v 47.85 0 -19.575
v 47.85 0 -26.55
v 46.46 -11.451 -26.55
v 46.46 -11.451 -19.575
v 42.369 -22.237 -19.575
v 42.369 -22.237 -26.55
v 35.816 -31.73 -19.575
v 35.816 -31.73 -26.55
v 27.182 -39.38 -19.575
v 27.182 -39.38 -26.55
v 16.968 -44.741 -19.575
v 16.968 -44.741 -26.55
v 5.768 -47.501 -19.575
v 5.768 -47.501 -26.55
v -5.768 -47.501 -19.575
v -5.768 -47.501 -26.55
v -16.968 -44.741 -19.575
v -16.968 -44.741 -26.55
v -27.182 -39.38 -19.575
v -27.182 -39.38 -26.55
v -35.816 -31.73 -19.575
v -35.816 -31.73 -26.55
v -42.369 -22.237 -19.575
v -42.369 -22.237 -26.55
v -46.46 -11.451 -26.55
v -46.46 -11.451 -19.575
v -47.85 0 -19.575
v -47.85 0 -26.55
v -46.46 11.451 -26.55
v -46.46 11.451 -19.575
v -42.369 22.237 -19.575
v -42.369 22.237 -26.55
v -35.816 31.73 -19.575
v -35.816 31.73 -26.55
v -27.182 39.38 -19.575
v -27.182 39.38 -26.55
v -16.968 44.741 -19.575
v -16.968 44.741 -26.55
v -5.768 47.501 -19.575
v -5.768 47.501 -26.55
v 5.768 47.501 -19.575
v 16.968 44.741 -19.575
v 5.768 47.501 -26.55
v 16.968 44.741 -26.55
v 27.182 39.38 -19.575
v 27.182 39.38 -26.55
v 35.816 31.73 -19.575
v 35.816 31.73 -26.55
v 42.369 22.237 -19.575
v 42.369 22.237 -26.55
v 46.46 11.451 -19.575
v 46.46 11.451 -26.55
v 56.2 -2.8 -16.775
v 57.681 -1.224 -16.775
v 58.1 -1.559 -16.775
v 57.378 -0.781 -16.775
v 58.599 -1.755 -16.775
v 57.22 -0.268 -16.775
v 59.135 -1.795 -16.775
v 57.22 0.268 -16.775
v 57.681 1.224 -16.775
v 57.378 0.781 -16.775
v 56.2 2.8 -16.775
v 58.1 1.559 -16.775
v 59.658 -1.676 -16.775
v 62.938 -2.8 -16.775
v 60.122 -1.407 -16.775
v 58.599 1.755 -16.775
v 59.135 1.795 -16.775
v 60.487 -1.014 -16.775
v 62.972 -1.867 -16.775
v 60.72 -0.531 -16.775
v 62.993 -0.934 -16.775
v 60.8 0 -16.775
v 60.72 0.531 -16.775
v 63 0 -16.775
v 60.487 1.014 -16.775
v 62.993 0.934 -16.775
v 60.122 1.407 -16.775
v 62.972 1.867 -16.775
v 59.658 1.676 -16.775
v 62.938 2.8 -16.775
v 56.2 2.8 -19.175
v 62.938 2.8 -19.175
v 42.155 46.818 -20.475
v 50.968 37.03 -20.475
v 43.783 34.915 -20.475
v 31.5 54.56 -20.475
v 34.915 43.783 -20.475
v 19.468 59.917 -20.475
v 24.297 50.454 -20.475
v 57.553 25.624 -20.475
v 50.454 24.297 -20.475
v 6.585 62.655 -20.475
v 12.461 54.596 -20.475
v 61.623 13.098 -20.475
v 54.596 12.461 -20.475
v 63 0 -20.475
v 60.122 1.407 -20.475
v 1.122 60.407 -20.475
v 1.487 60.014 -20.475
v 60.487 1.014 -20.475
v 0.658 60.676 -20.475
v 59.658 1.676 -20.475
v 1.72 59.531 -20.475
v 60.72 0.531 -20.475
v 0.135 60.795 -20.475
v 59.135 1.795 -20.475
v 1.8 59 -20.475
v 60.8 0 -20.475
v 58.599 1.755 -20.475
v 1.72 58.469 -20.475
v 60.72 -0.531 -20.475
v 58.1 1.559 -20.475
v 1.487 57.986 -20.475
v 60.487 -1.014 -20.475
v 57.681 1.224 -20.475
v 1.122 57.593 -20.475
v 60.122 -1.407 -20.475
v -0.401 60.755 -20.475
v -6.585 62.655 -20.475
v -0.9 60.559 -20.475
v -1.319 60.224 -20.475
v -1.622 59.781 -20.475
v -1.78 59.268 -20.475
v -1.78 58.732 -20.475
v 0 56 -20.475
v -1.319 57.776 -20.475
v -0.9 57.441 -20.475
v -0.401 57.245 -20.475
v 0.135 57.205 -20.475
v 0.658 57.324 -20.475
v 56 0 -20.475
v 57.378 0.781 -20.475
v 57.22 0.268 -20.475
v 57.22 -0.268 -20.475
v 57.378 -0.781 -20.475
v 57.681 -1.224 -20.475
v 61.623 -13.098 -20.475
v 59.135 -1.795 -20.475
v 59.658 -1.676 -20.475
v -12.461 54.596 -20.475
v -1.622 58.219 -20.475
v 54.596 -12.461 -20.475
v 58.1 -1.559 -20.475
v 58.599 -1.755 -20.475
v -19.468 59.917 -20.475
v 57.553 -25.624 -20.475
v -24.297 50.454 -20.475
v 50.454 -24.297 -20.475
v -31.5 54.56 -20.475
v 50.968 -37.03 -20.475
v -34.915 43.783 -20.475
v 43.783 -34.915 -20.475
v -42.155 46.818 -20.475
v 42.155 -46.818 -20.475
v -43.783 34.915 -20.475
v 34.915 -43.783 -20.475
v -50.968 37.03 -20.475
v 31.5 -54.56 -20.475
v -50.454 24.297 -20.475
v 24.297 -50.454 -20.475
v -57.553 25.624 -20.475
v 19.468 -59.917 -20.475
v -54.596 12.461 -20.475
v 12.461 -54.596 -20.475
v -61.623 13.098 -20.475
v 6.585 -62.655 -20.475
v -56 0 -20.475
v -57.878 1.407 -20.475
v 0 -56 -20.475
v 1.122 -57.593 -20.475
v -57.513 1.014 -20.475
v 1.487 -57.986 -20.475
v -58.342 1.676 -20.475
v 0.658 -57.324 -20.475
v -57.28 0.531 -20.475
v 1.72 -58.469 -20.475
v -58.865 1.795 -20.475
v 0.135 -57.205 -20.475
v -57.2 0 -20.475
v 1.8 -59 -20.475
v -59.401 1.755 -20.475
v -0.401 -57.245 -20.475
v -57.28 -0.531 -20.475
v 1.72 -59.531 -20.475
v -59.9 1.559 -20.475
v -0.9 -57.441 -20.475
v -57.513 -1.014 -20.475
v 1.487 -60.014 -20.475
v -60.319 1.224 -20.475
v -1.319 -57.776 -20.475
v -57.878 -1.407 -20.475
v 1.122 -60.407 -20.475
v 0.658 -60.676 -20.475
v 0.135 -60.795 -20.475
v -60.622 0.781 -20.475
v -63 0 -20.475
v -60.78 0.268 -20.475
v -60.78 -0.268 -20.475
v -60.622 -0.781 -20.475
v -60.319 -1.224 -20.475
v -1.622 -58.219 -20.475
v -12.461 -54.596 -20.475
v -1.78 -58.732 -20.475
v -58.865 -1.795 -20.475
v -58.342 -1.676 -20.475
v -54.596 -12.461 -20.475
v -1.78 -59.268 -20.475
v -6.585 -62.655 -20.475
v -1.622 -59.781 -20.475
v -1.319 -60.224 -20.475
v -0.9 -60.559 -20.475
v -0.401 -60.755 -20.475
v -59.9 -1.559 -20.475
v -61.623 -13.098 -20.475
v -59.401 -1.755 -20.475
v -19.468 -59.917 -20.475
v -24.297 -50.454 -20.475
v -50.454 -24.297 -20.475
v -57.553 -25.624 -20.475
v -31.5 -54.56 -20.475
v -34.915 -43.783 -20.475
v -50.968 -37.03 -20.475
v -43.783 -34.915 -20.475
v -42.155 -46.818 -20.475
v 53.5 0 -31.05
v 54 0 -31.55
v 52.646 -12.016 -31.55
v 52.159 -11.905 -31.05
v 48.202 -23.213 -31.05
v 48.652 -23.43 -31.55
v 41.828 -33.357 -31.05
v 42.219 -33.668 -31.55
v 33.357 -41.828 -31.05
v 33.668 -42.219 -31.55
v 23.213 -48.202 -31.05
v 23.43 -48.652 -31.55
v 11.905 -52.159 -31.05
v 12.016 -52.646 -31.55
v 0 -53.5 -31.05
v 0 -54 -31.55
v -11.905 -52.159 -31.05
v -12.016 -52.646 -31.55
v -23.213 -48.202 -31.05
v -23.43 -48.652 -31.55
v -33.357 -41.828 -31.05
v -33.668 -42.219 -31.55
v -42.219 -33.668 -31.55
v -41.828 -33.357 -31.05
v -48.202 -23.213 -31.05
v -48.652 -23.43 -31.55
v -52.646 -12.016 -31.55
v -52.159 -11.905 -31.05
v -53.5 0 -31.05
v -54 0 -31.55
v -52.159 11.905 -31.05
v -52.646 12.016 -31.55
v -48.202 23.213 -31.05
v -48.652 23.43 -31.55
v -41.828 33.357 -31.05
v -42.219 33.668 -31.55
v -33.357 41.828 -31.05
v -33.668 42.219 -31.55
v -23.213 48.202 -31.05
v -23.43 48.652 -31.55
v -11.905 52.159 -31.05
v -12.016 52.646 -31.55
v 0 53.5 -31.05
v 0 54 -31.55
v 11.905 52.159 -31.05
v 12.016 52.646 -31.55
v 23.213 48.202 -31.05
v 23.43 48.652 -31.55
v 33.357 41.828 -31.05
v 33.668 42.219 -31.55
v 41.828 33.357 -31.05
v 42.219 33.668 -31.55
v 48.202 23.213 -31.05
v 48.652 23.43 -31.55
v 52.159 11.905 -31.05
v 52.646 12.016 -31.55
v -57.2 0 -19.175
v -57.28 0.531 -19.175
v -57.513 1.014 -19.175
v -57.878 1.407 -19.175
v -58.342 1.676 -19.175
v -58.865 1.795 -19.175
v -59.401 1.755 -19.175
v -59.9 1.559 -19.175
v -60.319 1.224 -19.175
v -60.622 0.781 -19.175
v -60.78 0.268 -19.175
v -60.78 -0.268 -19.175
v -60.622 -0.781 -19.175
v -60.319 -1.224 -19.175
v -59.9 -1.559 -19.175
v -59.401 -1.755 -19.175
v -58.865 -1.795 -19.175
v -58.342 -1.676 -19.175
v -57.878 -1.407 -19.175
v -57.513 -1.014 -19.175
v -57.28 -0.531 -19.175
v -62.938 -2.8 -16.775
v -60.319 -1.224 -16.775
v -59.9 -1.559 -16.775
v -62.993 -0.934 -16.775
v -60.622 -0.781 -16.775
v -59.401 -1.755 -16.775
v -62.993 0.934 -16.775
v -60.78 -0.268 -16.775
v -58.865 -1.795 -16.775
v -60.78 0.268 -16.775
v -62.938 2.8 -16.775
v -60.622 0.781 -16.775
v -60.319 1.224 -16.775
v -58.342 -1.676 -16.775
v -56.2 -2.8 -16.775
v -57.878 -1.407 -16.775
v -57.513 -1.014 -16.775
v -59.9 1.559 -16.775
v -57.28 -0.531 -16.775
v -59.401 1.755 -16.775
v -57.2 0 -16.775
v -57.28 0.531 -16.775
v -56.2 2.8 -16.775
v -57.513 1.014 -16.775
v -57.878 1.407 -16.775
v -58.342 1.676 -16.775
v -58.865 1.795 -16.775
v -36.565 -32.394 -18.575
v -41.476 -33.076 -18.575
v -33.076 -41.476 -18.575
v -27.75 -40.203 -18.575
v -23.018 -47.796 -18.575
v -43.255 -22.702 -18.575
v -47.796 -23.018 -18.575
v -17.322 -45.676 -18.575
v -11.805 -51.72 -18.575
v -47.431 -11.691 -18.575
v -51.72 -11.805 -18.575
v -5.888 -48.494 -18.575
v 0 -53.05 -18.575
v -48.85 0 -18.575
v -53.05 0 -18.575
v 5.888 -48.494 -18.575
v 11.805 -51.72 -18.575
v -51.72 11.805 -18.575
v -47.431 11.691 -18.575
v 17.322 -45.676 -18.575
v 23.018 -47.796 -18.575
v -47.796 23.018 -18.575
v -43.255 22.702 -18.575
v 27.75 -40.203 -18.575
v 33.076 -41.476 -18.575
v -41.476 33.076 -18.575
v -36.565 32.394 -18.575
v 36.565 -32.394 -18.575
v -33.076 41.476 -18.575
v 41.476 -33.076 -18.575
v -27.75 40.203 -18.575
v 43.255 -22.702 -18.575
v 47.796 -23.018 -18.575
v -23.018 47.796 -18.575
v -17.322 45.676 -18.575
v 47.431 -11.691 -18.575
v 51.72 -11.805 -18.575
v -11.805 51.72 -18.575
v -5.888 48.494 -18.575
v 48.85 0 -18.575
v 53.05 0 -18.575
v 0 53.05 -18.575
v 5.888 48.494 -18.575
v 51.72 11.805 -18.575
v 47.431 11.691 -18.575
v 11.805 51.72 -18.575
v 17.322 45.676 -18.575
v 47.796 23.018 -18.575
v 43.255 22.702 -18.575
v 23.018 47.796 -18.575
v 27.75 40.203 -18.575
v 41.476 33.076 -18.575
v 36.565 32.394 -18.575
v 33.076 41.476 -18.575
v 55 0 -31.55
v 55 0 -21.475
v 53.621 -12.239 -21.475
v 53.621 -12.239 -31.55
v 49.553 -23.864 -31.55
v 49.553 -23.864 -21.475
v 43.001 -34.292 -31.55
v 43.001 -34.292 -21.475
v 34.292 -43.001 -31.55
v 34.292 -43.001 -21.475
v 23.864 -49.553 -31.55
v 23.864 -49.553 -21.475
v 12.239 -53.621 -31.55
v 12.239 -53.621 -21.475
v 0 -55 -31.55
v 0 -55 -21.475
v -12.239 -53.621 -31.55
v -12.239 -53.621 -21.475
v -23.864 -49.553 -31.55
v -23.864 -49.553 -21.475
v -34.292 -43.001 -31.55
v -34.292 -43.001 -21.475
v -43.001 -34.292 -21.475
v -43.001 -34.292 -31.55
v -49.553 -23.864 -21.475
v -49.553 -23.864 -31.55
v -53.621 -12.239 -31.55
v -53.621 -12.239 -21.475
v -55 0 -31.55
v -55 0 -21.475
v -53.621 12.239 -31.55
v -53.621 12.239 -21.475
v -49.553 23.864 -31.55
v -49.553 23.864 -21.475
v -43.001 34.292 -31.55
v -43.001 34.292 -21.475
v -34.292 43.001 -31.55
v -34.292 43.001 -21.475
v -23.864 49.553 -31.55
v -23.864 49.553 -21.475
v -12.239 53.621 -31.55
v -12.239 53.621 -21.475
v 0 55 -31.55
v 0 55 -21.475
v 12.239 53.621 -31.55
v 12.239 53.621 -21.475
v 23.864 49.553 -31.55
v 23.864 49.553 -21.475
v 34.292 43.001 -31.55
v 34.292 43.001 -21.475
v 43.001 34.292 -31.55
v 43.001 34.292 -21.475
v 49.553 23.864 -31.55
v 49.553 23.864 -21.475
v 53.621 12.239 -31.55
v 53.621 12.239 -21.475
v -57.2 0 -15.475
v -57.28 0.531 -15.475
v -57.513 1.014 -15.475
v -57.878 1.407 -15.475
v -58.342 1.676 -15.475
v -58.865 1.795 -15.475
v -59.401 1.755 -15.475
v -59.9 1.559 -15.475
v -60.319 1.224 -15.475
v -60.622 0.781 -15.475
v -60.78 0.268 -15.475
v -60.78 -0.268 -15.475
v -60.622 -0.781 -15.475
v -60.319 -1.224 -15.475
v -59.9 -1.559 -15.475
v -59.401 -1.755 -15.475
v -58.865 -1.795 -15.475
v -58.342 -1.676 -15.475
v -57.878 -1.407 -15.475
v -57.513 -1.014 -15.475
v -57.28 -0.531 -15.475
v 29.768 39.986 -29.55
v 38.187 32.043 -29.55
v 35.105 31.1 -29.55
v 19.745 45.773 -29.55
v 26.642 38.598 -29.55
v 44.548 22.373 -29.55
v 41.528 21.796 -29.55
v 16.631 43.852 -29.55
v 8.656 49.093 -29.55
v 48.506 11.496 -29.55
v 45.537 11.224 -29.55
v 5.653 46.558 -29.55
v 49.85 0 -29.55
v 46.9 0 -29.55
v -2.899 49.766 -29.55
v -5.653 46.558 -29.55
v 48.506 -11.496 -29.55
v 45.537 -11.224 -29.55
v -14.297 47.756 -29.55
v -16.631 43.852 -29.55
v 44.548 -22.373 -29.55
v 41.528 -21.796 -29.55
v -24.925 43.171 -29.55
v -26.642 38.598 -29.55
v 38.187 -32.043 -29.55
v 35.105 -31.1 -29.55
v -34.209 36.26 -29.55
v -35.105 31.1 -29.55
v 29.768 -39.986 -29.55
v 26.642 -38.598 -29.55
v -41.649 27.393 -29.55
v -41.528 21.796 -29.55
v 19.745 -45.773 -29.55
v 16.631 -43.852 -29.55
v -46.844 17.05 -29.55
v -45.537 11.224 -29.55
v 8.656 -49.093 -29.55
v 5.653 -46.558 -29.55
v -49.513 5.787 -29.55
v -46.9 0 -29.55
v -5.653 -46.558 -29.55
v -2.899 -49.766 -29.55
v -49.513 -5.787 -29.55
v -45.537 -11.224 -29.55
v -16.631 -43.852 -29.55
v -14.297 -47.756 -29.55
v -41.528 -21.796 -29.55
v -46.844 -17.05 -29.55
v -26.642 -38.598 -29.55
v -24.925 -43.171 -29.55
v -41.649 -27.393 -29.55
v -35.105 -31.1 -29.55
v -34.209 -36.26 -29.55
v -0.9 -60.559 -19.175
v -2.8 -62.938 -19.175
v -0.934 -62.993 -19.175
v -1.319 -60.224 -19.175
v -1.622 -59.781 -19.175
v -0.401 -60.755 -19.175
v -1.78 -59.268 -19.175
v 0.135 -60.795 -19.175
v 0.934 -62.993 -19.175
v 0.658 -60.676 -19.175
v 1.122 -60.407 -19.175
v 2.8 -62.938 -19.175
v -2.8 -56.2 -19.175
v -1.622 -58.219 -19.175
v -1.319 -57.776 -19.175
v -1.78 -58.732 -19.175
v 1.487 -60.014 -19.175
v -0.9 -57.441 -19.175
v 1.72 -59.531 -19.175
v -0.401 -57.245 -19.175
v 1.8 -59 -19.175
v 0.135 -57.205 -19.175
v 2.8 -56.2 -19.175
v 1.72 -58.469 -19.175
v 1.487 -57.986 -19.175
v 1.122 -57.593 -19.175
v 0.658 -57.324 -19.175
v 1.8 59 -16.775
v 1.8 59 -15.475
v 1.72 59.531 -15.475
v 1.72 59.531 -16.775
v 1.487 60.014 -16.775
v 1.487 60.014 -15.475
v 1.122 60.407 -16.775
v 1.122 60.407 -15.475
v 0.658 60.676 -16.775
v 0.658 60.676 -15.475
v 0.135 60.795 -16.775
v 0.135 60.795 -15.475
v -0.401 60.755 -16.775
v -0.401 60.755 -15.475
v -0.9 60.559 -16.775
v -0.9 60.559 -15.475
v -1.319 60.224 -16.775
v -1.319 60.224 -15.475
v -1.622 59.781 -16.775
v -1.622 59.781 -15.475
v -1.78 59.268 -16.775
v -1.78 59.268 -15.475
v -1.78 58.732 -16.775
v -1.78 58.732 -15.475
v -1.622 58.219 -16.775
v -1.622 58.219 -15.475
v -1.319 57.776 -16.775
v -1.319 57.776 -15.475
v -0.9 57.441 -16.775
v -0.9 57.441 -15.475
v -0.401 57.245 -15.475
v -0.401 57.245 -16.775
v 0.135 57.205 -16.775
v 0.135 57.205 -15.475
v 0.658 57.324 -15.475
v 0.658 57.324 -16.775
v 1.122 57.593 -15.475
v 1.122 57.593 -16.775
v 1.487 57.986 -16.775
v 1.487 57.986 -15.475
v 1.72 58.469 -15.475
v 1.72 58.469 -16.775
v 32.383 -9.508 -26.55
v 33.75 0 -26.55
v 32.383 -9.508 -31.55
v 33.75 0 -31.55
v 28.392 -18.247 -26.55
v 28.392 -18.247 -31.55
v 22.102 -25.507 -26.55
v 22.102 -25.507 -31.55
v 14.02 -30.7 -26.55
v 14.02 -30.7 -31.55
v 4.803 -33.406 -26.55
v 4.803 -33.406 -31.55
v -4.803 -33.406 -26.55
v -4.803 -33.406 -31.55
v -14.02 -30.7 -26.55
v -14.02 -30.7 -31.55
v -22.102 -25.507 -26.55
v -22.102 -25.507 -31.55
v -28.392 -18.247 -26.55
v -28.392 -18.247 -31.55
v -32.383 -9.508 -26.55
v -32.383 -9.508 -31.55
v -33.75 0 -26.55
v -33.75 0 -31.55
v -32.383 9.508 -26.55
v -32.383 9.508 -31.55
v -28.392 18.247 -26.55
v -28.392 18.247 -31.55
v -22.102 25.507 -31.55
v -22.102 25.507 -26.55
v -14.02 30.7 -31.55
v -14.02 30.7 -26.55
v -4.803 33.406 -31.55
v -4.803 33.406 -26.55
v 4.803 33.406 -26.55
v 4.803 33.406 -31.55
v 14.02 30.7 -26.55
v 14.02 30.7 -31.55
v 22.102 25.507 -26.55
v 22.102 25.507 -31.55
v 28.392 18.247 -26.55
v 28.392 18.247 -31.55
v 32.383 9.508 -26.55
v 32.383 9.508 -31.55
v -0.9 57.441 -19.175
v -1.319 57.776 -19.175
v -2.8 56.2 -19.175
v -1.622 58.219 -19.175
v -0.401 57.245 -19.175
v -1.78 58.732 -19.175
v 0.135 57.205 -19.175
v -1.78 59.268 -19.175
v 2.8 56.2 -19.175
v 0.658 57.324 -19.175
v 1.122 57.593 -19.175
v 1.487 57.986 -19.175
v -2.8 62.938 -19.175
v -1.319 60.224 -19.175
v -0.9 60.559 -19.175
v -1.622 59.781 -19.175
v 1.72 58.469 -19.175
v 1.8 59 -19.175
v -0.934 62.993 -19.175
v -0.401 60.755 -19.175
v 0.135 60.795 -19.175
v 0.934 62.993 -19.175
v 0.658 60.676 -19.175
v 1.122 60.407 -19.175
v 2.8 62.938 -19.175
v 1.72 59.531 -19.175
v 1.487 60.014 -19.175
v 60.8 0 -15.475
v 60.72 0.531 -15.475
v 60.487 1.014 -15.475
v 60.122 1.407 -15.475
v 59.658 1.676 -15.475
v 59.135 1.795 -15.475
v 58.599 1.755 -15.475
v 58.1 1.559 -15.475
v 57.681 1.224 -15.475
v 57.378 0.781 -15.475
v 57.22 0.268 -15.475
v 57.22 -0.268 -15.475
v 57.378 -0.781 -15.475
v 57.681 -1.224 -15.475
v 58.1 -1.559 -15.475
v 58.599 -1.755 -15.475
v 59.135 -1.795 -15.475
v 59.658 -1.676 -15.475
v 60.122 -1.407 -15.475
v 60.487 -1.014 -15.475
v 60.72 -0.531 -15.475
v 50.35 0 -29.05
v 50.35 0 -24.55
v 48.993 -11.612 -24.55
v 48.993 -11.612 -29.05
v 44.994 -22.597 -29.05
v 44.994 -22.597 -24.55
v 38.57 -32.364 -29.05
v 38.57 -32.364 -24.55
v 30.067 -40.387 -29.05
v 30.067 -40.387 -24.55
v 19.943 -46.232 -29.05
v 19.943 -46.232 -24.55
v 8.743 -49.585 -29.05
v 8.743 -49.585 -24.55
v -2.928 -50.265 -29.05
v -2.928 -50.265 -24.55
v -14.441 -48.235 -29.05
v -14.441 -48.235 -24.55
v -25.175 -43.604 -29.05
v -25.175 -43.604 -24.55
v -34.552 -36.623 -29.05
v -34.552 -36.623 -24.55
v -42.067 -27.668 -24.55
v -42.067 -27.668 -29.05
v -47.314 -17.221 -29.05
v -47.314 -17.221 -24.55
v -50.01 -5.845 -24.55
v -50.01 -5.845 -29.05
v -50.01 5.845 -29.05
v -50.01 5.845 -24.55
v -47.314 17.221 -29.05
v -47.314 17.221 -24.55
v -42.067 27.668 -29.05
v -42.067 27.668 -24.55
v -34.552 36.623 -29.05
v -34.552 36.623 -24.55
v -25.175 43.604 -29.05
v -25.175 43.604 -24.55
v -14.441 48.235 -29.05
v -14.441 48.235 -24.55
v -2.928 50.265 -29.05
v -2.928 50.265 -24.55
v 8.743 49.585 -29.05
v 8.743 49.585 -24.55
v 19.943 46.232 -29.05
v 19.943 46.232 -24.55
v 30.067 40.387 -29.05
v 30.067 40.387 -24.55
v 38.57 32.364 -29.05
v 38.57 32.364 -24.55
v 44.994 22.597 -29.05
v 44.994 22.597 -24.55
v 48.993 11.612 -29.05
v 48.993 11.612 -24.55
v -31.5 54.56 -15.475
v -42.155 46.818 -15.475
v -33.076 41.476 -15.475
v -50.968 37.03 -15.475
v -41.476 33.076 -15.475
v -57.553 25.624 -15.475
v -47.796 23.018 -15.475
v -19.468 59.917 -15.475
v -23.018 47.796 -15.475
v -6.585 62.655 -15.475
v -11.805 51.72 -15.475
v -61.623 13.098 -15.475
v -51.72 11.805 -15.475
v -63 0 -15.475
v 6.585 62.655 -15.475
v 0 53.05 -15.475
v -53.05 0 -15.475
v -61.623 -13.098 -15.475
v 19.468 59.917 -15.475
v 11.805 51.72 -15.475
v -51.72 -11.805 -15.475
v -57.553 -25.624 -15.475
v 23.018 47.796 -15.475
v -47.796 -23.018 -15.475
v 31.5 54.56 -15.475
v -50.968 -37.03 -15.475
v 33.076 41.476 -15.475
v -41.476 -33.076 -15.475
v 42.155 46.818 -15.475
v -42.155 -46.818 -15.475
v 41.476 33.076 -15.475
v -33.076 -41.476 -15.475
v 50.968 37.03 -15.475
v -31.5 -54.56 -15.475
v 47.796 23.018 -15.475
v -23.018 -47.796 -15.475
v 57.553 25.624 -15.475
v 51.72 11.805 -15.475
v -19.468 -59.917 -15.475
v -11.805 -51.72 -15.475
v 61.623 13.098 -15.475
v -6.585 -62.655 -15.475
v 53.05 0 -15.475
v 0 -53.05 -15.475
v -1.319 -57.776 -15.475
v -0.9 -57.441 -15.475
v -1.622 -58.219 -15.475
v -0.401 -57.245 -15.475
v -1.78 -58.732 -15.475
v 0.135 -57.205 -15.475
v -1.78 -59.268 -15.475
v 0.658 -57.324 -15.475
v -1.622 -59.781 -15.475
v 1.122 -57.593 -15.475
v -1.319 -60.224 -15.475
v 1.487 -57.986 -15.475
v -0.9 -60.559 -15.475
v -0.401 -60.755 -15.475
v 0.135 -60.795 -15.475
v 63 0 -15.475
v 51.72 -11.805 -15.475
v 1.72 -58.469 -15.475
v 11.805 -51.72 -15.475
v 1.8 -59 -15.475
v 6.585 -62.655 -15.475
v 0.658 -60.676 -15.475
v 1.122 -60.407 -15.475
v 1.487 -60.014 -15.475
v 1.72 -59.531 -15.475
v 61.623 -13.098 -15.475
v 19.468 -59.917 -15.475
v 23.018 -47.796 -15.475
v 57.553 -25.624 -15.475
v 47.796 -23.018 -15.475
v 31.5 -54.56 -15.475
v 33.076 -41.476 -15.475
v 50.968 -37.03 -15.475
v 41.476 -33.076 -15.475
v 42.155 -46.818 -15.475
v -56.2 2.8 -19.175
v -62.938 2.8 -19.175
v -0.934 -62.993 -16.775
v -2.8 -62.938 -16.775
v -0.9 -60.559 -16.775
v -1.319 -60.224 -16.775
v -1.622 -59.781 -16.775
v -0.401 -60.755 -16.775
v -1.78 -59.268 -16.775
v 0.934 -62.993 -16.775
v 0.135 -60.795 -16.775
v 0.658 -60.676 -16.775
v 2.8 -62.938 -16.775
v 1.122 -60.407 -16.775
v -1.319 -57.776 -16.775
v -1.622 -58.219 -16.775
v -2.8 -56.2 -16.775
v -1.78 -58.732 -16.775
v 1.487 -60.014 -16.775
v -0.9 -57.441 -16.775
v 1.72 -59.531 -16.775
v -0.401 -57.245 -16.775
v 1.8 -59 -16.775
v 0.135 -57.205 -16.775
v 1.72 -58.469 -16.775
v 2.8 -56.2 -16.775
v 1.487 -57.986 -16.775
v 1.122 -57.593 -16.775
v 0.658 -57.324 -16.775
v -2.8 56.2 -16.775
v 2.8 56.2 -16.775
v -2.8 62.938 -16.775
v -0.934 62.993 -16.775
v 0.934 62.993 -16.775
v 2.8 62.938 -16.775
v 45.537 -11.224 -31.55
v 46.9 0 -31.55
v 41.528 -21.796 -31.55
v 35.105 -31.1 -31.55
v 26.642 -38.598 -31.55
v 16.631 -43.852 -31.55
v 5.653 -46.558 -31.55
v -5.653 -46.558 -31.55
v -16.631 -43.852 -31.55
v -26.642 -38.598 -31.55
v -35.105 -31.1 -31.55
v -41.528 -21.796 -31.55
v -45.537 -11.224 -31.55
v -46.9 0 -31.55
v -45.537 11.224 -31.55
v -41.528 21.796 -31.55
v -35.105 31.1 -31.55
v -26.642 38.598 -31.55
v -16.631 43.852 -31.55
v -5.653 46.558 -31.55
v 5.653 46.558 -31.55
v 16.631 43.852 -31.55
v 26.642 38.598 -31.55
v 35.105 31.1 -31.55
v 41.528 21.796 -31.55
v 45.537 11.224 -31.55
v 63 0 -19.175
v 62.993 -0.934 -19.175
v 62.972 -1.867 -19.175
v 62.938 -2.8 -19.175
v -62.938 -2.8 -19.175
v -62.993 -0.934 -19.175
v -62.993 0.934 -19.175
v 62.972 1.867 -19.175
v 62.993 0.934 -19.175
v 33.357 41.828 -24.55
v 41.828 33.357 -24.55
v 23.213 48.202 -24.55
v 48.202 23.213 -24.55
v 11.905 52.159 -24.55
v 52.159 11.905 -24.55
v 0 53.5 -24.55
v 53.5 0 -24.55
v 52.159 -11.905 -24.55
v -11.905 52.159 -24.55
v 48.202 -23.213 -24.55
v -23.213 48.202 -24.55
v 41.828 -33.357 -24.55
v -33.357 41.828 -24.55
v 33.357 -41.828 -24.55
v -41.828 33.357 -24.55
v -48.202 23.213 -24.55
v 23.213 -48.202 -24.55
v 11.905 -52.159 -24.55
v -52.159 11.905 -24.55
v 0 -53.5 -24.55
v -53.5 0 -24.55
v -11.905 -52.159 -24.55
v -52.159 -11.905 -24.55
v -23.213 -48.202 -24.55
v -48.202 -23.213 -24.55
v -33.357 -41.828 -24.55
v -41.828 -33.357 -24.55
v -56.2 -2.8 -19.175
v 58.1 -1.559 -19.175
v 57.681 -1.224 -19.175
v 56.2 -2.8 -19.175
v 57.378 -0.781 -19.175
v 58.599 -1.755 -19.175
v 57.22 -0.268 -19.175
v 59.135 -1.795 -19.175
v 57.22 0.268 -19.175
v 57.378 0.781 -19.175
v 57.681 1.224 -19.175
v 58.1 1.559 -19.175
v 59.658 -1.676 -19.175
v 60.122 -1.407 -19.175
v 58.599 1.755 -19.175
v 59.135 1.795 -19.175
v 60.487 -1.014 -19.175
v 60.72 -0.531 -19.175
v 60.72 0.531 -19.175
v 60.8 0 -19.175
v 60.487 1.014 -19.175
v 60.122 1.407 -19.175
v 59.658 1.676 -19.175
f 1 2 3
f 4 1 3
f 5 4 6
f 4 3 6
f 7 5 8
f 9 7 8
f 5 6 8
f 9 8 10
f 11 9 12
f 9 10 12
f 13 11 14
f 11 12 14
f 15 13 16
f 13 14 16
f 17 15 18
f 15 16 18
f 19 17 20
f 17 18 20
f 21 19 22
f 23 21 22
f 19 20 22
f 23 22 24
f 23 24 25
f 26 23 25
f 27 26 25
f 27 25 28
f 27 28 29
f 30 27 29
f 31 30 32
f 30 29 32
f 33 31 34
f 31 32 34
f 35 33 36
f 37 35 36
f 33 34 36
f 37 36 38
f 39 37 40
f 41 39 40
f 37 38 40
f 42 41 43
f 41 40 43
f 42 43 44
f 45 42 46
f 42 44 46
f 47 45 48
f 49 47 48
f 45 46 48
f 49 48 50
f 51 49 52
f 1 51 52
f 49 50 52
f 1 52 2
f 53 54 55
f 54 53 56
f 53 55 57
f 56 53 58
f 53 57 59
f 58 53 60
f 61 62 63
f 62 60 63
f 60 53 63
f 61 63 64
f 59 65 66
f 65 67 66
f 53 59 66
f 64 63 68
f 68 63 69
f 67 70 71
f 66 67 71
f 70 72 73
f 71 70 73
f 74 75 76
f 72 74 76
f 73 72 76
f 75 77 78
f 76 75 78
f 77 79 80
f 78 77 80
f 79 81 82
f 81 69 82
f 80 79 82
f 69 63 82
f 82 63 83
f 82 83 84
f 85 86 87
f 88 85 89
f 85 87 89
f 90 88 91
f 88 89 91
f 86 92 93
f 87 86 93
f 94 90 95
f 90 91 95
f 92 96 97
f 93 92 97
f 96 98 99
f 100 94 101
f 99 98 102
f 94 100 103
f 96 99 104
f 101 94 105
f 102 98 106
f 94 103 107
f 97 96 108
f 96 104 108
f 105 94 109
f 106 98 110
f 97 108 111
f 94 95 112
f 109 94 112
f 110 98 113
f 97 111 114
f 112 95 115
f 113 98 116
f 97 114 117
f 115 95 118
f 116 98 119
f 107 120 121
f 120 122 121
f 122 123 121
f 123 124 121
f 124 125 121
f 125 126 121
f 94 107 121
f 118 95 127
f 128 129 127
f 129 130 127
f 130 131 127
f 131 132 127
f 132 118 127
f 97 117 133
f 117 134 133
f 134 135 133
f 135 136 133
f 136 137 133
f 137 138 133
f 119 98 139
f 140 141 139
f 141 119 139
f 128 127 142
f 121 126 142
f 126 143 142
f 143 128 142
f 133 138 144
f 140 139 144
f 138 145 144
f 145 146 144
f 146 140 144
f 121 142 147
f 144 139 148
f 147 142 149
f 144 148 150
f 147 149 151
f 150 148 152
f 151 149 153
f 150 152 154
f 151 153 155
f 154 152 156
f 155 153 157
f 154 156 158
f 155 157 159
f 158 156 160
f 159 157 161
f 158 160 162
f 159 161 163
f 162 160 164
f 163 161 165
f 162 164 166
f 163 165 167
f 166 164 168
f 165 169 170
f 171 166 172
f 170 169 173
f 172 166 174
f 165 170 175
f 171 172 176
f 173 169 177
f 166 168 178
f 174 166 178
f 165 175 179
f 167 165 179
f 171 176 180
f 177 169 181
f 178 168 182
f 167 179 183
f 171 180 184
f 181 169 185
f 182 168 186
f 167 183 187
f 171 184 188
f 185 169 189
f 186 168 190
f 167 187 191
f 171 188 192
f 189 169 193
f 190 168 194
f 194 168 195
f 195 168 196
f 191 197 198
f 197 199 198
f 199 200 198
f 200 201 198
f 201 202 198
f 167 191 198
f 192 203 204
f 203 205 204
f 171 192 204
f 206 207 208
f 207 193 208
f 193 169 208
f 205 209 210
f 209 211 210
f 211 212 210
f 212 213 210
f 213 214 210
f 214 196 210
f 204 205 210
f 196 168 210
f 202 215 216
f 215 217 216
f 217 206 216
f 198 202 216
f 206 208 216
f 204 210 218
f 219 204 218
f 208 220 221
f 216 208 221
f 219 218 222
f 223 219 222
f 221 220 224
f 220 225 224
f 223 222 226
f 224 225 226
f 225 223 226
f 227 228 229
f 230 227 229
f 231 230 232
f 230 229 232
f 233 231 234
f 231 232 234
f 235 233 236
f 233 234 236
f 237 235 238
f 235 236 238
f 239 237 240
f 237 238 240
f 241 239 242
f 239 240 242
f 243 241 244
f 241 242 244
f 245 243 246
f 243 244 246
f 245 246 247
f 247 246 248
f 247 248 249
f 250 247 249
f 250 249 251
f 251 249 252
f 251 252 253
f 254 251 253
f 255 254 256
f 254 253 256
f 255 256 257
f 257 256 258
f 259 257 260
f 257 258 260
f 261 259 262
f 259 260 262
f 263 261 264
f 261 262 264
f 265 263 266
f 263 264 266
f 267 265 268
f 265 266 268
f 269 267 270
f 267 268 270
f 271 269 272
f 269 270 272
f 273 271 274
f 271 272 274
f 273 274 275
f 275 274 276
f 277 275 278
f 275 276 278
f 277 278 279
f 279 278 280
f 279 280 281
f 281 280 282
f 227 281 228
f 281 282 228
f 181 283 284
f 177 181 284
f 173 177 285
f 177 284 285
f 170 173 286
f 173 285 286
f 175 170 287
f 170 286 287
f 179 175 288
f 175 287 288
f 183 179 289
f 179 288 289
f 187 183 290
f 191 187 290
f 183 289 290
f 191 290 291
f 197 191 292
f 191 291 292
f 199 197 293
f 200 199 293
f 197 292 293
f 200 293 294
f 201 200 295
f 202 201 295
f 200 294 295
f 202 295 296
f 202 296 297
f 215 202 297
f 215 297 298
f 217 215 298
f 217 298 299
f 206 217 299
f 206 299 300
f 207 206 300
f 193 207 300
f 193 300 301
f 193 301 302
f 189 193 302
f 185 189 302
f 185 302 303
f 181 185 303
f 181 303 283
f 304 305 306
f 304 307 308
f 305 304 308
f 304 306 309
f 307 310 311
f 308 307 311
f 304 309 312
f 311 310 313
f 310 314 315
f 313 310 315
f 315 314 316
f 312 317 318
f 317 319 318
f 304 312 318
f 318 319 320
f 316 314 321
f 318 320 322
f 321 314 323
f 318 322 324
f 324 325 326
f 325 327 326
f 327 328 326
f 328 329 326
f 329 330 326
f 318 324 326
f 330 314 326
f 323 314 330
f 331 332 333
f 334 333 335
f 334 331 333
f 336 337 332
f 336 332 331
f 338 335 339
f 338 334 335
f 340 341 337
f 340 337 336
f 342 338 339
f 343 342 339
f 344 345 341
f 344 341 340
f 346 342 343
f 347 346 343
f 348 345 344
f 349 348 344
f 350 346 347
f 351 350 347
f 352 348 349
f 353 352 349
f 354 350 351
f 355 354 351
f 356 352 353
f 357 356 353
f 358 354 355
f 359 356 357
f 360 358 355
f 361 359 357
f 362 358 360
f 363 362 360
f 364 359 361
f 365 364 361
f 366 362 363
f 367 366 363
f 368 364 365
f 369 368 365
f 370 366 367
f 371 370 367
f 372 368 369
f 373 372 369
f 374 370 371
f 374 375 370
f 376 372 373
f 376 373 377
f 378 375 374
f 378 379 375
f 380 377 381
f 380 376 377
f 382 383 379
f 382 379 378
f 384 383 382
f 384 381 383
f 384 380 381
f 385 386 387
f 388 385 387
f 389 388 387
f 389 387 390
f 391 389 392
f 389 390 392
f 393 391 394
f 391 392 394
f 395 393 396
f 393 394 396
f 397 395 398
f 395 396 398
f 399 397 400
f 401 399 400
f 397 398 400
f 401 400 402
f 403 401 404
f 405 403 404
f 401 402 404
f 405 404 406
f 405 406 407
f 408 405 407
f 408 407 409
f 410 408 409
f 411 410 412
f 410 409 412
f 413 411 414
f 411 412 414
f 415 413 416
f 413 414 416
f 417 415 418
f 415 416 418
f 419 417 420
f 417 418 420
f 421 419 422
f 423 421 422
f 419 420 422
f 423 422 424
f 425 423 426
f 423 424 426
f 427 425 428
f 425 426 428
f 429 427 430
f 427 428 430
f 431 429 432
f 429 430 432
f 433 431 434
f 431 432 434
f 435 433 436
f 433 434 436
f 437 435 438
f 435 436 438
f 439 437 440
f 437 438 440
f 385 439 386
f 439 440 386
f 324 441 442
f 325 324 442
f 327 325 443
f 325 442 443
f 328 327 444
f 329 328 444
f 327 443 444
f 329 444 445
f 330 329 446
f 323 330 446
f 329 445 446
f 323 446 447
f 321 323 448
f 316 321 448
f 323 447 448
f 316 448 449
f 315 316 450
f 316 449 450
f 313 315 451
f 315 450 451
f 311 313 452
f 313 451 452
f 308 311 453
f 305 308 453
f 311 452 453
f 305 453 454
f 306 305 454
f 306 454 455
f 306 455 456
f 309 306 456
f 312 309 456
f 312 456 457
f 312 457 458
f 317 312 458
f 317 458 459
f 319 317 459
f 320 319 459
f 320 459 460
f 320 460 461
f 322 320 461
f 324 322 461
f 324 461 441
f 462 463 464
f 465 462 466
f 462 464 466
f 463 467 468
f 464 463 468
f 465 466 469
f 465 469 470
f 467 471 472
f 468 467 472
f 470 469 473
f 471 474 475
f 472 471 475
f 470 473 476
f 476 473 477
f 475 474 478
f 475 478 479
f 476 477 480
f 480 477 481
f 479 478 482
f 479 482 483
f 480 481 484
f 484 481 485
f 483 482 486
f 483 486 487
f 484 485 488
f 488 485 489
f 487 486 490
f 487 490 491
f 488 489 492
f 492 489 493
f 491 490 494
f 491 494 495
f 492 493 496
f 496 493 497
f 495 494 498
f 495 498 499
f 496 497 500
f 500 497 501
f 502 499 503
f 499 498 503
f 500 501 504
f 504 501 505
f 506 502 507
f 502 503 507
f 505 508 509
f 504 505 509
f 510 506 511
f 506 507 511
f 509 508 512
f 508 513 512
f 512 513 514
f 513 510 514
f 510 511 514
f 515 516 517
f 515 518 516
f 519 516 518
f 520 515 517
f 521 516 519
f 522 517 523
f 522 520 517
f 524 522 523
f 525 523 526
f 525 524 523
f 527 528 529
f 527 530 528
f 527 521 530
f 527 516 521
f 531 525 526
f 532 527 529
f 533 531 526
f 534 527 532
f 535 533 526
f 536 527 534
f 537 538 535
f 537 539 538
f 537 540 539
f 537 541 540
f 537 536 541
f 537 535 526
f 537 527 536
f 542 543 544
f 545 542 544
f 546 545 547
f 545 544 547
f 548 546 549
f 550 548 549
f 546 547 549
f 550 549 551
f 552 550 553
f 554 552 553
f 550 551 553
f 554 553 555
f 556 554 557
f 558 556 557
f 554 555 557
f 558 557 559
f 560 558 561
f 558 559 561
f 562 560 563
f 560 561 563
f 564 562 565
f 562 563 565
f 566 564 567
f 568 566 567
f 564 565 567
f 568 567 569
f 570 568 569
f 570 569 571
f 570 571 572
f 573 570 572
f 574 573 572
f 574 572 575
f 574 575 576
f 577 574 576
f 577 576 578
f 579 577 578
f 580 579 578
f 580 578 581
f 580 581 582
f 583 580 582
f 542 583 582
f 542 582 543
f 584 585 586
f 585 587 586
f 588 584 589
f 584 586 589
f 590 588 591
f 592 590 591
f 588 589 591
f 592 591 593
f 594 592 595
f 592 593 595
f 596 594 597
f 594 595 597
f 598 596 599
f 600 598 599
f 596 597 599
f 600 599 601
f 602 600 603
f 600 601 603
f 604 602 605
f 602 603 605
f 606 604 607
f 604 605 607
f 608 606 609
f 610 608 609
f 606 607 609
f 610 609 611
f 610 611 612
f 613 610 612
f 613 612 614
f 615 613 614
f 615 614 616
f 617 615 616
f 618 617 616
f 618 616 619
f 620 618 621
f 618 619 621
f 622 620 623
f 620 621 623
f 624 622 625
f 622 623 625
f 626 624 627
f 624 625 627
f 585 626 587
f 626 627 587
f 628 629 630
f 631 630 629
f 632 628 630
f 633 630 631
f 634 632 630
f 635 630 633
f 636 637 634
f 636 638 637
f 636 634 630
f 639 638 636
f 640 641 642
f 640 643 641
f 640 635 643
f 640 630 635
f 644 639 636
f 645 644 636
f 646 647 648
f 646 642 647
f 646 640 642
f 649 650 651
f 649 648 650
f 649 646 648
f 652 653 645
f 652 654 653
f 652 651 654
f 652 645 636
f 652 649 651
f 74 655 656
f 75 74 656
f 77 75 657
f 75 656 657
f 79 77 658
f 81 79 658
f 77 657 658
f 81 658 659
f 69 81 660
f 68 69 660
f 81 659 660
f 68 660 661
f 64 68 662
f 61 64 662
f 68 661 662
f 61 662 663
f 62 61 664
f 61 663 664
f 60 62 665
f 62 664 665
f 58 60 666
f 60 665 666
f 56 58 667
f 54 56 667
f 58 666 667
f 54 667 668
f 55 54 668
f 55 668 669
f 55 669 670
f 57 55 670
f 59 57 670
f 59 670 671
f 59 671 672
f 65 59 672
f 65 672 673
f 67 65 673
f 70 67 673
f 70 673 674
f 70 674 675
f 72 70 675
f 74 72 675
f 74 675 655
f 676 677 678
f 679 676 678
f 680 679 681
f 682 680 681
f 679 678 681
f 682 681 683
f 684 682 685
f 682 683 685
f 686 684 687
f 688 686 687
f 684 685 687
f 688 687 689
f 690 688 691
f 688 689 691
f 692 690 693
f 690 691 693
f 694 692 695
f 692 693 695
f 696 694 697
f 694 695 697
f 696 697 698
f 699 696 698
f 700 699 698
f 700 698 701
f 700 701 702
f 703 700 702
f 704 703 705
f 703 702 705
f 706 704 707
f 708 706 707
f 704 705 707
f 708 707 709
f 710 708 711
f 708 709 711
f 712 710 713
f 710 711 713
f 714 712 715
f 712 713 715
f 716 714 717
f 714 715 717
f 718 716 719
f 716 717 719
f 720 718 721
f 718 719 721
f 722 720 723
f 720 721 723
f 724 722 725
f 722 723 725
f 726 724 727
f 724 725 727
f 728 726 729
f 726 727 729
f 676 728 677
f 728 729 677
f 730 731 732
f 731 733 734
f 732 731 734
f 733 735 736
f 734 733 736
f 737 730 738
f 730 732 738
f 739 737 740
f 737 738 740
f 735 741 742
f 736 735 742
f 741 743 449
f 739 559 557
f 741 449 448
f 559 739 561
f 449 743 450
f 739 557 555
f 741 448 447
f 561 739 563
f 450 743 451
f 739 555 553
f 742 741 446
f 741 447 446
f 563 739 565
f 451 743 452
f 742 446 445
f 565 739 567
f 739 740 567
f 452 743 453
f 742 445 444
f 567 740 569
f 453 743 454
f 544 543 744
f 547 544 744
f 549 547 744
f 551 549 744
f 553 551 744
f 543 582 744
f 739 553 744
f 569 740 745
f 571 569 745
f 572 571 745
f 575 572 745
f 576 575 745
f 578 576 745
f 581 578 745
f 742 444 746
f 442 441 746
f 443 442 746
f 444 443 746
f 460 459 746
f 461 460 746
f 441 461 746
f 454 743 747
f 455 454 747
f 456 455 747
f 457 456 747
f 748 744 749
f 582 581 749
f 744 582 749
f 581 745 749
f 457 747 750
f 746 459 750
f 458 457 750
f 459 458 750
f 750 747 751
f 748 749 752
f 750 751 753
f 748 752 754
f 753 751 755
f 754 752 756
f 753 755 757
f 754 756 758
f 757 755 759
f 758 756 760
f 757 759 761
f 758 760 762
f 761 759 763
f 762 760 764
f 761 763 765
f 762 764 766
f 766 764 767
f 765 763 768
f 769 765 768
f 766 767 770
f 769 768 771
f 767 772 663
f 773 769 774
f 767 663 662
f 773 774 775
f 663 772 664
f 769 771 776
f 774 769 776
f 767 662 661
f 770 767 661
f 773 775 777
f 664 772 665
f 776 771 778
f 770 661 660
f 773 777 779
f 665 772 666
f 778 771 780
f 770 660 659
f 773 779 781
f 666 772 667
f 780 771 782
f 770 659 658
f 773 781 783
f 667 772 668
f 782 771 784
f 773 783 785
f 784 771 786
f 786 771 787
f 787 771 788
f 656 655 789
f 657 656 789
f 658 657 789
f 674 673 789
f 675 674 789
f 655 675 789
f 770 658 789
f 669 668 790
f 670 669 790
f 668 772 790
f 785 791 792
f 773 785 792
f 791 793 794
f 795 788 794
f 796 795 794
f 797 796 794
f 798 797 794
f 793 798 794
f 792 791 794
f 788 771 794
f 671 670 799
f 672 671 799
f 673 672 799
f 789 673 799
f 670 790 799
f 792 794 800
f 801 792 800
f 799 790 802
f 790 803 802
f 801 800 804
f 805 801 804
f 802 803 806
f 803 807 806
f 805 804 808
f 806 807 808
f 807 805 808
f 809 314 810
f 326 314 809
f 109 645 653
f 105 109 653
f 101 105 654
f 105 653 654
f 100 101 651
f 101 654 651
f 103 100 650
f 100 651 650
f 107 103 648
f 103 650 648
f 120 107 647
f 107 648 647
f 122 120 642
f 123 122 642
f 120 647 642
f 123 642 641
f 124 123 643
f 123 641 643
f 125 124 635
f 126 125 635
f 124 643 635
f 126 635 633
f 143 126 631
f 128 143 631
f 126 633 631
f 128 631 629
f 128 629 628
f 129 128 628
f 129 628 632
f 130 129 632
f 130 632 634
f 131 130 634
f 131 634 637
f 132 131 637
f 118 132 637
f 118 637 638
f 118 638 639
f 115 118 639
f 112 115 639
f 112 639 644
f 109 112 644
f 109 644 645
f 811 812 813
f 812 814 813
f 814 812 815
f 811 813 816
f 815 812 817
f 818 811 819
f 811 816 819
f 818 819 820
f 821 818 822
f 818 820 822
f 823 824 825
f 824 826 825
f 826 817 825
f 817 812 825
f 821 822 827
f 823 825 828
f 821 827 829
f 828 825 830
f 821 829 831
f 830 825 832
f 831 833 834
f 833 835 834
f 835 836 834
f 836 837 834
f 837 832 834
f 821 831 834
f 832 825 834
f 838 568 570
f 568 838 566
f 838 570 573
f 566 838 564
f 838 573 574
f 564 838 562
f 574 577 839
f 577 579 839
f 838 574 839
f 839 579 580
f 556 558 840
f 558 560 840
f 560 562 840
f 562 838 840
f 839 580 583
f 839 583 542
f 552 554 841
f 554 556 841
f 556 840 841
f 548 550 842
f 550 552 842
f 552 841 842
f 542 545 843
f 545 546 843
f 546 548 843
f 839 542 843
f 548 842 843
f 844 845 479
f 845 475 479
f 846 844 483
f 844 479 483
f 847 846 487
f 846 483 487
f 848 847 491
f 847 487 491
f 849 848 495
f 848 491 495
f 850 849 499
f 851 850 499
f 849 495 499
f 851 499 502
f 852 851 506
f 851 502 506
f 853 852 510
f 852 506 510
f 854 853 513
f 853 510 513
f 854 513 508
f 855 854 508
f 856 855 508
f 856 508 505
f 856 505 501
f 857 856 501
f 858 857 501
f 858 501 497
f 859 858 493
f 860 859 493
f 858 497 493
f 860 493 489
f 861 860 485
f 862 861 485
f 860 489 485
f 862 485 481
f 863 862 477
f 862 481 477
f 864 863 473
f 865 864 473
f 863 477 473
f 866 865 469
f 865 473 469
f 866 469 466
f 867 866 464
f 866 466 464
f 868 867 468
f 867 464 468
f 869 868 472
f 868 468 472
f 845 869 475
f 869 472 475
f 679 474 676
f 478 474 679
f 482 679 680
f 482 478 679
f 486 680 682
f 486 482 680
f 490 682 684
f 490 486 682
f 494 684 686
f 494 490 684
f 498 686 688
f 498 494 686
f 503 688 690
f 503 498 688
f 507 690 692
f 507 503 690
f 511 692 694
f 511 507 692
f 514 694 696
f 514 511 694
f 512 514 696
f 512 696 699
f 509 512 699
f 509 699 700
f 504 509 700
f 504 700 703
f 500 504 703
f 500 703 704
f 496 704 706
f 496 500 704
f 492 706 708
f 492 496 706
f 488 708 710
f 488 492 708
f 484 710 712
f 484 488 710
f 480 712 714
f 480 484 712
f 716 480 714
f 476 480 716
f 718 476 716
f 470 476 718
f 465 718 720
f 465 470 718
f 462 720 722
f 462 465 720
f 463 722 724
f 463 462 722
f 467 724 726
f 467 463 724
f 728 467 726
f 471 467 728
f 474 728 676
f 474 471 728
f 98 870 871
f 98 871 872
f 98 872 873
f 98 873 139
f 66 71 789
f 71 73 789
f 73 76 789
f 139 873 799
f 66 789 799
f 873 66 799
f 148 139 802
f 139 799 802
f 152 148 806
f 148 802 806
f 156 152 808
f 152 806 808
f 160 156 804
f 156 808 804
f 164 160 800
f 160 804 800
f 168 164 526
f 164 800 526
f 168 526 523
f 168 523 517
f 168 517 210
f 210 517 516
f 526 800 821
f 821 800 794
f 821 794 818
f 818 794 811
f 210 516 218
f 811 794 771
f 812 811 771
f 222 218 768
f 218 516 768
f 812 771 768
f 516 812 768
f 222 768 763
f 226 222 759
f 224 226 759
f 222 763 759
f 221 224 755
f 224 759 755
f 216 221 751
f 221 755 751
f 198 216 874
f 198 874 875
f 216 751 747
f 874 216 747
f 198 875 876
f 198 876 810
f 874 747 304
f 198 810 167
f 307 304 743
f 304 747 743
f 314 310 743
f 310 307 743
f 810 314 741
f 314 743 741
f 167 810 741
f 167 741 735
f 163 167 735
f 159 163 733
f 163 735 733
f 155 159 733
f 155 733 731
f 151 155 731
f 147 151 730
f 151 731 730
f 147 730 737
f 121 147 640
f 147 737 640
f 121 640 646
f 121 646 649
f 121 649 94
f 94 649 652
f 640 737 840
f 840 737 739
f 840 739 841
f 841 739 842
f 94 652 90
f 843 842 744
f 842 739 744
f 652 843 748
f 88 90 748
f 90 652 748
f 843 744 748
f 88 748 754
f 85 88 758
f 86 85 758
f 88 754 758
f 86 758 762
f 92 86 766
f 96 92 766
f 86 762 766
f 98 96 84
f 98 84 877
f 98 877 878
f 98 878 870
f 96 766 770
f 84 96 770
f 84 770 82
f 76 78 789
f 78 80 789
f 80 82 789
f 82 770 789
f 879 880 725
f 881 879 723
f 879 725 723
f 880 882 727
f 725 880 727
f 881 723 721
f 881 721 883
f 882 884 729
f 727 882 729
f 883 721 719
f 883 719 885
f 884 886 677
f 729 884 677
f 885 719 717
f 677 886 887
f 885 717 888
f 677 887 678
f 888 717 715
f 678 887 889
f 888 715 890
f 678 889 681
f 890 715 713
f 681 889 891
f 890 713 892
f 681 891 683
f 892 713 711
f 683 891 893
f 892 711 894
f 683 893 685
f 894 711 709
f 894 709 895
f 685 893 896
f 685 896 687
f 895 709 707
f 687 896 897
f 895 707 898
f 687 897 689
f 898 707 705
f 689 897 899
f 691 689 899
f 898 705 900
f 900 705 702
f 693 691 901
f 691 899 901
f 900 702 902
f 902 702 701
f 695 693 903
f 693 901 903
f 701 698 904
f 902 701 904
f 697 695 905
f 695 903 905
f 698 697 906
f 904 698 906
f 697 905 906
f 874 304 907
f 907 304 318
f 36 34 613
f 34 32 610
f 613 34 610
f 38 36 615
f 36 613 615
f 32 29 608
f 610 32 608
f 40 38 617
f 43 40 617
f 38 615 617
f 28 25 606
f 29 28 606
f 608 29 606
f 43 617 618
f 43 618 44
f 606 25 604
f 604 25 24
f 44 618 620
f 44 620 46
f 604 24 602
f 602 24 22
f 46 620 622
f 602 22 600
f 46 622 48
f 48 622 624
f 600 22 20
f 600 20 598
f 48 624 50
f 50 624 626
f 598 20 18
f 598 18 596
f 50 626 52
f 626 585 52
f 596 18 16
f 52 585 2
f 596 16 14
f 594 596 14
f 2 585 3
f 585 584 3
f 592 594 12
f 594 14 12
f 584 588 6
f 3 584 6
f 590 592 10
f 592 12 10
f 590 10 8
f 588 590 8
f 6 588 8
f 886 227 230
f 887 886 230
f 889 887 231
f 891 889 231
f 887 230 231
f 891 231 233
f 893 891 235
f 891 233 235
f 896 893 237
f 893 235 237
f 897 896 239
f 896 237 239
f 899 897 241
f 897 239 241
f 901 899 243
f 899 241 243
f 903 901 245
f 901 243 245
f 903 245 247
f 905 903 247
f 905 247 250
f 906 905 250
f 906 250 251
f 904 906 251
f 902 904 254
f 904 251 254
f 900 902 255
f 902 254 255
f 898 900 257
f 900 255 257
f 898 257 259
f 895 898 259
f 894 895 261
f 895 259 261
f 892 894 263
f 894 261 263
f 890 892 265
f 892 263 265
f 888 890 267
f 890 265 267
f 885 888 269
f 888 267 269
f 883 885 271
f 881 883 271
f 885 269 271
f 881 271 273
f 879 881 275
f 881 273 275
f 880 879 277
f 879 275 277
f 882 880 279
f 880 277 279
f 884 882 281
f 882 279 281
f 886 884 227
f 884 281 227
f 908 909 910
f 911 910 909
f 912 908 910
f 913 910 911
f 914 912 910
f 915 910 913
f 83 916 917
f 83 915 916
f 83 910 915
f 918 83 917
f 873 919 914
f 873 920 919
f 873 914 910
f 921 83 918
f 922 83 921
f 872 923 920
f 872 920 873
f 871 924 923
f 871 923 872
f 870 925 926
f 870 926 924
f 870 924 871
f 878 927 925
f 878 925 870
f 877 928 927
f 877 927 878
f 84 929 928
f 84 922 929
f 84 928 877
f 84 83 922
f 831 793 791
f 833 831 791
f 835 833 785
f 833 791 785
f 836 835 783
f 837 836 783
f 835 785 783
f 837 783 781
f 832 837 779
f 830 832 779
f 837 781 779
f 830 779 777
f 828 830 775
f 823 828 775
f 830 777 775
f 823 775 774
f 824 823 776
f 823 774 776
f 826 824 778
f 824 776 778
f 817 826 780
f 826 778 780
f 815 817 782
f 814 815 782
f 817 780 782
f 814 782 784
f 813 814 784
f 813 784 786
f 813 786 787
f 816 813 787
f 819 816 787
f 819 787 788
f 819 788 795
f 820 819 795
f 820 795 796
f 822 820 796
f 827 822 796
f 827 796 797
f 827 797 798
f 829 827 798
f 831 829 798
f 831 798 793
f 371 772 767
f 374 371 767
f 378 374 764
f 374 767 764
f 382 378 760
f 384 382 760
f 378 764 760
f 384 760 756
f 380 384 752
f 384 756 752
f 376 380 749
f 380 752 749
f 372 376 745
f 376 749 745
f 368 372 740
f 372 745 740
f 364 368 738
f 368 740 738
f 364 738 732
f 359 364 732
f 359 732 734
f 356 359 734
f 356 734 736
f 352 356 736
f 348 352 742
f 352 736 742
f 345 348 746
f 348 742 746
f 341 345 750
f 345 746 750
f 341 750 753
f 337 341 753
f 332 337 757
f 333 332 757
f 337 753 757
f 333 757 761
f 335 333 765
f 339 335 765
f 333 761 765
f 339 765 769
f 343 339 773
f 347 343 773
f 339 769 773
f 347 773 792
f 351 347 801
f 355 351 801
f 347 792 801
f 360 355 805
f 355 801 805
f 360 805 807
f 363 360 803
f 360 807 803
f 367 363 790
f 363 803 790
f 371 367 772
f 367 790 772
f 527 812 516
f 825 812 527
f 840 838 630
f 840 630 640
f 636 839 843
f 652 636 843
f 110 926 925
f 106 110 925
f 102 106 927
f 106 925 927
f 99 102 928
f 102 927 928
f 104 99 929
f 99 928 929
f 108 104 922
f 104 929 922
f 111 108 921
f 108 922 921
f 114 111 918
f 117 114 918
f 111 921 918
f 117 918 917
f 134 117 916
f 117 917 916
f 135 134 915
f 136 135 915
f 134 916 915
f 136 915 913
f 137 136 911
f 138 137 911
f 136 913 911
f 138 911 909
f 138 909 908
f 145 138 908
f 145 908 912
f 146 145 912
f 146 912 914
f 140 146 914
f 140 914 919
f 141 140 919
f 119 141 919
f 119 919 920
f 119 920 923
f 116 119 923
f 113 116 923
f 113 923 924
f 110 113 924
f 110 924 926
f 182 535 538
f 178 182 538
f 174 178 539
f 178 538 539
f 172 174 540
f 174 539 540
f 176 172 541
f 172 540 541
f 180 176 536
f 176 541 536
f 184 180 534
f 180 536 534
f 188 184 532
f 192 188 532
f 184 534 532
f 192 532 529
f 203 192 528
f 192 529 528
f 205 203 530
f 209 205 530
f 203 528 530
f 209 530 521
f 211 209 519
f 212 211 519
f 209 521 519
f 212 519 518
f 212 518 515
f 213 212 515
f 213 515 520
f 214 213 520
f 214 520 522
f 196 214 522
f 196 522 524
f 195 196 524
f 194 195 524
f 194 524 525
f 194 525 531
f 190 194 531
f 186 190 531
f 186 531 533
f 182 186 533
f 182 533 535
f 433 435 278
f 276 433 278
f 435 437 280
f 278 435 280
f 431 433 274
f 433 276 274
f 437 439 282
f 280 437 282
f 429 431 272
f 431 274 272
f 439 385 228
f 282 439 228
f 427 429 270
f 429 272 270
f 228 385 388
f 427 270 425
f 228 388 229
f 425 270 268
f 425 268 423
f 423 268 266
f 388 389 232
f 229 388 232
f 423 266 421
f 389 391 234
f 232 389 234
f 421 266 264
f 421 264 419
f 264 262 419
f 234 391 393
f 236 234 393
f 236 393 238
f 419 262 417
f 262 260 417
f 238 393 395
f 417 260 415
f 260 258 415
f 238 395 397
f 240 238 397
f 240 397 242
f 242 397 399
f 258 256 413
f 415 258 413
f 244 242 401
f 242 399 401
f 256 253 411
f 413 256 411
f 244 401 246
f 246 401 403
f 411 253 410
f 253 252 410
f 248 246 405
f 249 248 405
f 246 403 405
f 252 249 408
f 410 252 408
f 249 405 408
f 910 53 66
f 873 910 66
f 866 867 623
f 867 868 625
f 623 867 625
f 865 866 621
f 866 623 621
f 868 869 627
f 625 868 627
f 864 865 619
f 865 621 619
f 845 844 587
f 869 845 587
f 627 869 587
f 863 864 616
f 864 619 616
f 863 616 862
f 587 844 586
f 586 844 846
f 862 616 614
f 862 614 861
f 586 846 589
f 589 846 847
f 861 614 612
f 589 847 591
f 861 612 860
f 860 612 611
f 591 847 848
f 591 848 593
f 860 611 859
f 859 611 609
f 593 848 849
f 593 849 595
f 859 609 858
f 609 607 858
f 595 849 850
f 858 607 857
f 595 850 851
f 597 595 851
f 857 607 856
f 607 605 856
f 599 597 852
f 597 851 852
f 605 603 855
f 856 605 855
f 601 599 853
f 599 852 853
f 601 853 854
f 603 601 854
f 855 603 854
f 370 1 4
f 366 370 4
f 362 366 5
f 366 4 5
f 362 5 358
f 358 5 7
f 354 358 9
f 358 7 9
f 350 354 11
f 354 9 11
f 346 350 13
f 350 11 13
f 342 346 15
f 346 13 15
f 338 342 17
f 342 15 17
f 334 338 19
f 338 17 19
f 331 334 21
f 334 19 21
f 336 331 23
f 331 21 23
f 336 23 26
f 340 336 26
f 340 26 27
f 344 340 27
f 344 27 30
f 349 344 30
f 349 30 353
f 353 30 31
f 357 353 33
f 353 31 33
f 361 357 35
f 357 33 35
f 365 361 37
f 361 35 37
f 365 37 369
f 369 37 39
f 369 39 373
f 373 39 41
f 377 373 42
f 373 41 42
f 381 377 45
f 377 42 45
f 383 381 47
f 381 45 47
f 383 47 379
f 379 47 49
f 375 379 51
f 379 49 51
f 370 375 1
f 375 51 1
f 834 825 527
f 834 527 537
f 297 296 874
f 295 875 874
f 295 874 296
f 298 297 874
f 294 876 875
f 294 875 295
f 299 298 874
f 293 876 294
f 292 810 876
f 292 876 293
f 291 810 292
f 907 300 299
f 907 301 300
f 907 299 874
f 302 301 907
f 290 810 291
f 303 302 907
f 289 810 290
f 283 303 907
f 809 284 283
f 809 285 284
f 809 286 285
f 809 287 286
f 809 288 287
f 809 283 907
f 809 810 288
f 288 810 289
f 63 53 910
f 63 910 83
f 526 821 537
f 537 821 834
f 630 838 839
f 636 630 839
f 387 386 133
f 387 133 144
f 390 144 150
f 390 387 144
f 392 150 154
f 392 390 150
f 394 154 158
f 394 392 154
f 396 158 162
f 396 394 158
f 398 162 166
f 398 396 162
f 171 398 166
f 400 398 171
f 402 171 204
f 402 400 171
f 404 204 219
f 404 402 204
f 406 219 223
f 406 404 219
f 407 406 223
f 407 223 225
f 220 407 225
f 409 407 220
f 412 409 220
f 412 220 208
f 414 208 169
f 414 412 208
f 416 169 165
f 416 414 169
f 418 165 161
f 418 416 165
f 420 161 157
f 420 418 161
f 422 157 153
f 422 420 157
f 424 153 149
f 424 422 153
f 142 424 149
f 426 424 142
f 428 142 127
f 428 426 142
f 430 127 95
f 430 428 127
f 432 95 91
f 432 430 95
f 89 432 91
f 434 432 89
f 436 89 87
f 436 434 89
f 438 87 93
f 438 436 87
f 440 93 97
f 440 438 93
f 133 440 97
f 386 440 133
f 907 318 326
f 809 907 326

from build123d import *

# Parameters (mm, degrees)
SKETCH2_R               = 1.8
CUT_EXTRUDE1_DEPTH      = 10
SKETCH3_W               = 5.6
SKETCH3_H               = 10.691433847
CUT_EXTRUDE2_DEPTH      = 2.4
BOSS_EXTRUDE1_DEPTH     = 2.5
SKETCH5_R               = 1.8
CUT_EXTRUDE3_DEPTH      = 92.554113097
SKETCH6_W               = 5.6
SKETCH6_H               = 10.168713577
SKETCH6_W_2             = 10.168713577
SKETCH6_H_2             = 5.6
CUT_EXTRUDE4_DEPTH      = 2.4
CUT_EXTRUDE5_DEPTH      = 95.516678422
CUT_EXTRUDE5_DEPTH_BACK = 95.516678422
SKETCH7_W               = 158.937204397
SKETCH7_H               = 29.823360181
SKETCH8_R               = 53.05
CUT_EXTRUDE6_DEPTH      = 3.1
CHAMFER1_SIZE           = 1
CHAMFER3_SIZE           = 0.5
CHAMFER4_SIZE           = 0.5
CHAMFER5_SIZE           = 1


with BuildPart() as part:
    # Sketch1 → Revolve1 (revolve)
    with BuildSketch(Plane(origin=(0, 0, 0), x_dir=(1, 0, 0), z_dir=(0, 1, 0))):
        Polygon((43.05, 0), (43.05, 5.5), (40.025, 5.5), (40.025, 8.05), (33.75, 8.05), (33.75, 11.55), (47.85, 11.55), (47.85, 26.55), (33.75, 26.55), (33.75, 31.55), (46.9, 31.55), (46.9, 29.55), (50.35, 29.55), (50.35, 24.55), (53.5, 24.55), (53.5, 31.55), (55, 31.55), (55, 20.475), (63, 20.475), (63, 10.475), (55, 10.475), (55, 0), align=None)
    revolve(axis=Axis((0, 0, 39.851832449), (0, 0, -1)))

    # Sketch2 → Cut-Extrude1 (cut)
    with BuildSketch(Plane.XY):
        with Locations((0, 50)):
            Circle(SKETCH2_R)
        with Locations((43.301270189, 25)):
            Circle(SKETCH2_R)
        with Locations((43.301270189, -25)):
            Circle(SKETCH2_R)
        with Locations((0, -50)):
            Circle(SKETCH2_R)
        with Locations((-43.301270189, -25)):
            Circle(SKETCH2_R)
        with Locations((-43.301270189, 25)):
            Circle(SKETCH2_R)
    extrude(amount=-CUT_EXTRUDE1_DEPTH, mode=Mode.SUBTRACT)

    # Sketch3 → Cut-Extrude2 (cut)
    with BuildSketch(Plane.XY.offset(-5)):
        with Locations((0, 52.545716924)):
            Rectangle(SKETCH3_W, SKETCH3_H)
        Polygon((51.535452373, 26.520845793), (48.735452373, 31.370588054), (39.476399059, 26.024871131), (42.276399059, 21.175128869), align=None)
        Polygon((48.735452373, -31.370588054), (51.535452373, -26.520845793), (42.276399059, -21.175128869), (39.476399059, -26.024871131), align=None)
        with Locations((0, -52.545716924)):
            Rectangle(SKETCH3_W, SKETCH3_H)
        Polygon((-51.535452373, -26.520845793), (-48.735452373, -31.370588054), (-39.476399059, -26.024871131), (-42.276399059, -21.175128869), align=None)
        Polygon((-48.735452373, 31.370588054), (-51.535452373, 26.520845793), (-42.276399059, 21.175128869), (-39.476399059, 26.024871131), align=None)
    extrude(amount=-CUT_EXTRUDE2_DEPTH, mode=Mode.SUBTRACT)

    # Sketch4 → Boss-Extrude1 (add)
    with BuildSketch(Plane.XY.offset(-5.5)):
        with BuildLine():
            Line((-2.45, 42.980228012), (-2.45, 39.949945244))
            ThreePointArc((-2.45, 39.949945244), (0, 40.025), (2.45, 39.949945244))
            Line((2.45, 39.949945244), (2.45, 42.980228012))
            ThreePointArc((2.45, 42.980228012), (0, 43.05), (-2.45, 42.980228012))
        make_face()
    extrude(amount=BOSS_EXTRUDE1_DEPTH)

    # Sketch5 → Cut-Extrude3 (cut, through all)
    with BuildSketch(Plane.XY.offset(-10.475)):
        with Locations((0, 59)):
            Circle(SKETCH5_R)
        with Locations((59, 0)):
            Circle(SKETCH5_R)
        with Locations((0, -59)):
            Circle(SKETCH5_R)
        with Locations((-59, 0)):
            Circle(SKETCH5_R)
    extrude(amount=-CUT_EXTRUDE3_DEPTH, mode=Mode.SUBTRACT)

    # Sketch6 → Cut-Extrude4 (cut)
    with BuildSketch(Plane.XY.offset(-16.775)):
        with Locations((0, 61.284356789)):
            Rectangle(SKETCH6_W, SKETCH6_H)
        with Locations((61.284356789, 0)):
            Rectangle(SKETCH6_W_2, SKETCH6_H_2)
        with Locations((0, -61.284356789)):
            Rectangle(SKETCH6_W, SKETCH6_H)
        with Locations((-61.284356789, 0)):
            Rectangle(SKETCH6_W_2, SKETCH6_H_2)
    extrude(amount=-CUT_EXTRUDE4_DEPTH, mode=Mode.SUBTRACT)

    # Sketch7 → Cut-Extrude5 (cut, two sides: drawn at the far end of the back side and taken through both)
    with BuildSketch(Plane(origin=(0, 0, 0), x_dir=(1, 0, 0), z_dir=(0, 1, 0)).offset(-CUT_EXTRUDE5_DEPTH_BACK)):
        with Locations((-3.919975894, 0.56331991)):
            Rectangle(SKETCH7_W, SKETCH7_H)
    extrude(amount=CUT_EXTRUDE5_DEPTH + CUT_EXTRUDE5_DEPTH_BACK, mode=Mode.SUBTRACT)

    # Sketch8 → Cut-Extrude6 (cut)
    with BuildSketch(Plane.XY.offset(-15.475)):
        Circle(SKETCH8_R)
    extrude(amount=-CUT_EXTRUDE6_DEPTH, mode=Mode.SUBTRACT)

    # Chamfer1
    chamfer1_edges = [part.edges().sort_by_distance(p)[0] for p in [
        (-55, 0, -20.475),
    ]]
    chamfer(chamfer1_edges, length=CHAMFER1_SIZE)

    # Chamfer3
    chamfer3_edges = [part.edges().sort_by_distance(p)[0] for p in [
        (-50.35, 0, -29.55),
    ]]
    chamfer(chamfer3_edges, length=CHAMFER3_SIZE)

    # Chamfer4
    chamfer4_edges = [part.edges().sort_by_distance(p)[0] for p in [
        (-53.5, 0, -31.55),
    ]]
    chamfer(chamfer4_edges, length=CHAMFER4_SIZE)

    # Chamfer5
    chamfer5_edges = [part.edges().sort_by_distance(p)[0] for p in [
        (-47.85, 0, -18.575),
    ]]
    chamfer(chamfer5_edges, length=CHAMFER5_SIZE)


solid = part.part
